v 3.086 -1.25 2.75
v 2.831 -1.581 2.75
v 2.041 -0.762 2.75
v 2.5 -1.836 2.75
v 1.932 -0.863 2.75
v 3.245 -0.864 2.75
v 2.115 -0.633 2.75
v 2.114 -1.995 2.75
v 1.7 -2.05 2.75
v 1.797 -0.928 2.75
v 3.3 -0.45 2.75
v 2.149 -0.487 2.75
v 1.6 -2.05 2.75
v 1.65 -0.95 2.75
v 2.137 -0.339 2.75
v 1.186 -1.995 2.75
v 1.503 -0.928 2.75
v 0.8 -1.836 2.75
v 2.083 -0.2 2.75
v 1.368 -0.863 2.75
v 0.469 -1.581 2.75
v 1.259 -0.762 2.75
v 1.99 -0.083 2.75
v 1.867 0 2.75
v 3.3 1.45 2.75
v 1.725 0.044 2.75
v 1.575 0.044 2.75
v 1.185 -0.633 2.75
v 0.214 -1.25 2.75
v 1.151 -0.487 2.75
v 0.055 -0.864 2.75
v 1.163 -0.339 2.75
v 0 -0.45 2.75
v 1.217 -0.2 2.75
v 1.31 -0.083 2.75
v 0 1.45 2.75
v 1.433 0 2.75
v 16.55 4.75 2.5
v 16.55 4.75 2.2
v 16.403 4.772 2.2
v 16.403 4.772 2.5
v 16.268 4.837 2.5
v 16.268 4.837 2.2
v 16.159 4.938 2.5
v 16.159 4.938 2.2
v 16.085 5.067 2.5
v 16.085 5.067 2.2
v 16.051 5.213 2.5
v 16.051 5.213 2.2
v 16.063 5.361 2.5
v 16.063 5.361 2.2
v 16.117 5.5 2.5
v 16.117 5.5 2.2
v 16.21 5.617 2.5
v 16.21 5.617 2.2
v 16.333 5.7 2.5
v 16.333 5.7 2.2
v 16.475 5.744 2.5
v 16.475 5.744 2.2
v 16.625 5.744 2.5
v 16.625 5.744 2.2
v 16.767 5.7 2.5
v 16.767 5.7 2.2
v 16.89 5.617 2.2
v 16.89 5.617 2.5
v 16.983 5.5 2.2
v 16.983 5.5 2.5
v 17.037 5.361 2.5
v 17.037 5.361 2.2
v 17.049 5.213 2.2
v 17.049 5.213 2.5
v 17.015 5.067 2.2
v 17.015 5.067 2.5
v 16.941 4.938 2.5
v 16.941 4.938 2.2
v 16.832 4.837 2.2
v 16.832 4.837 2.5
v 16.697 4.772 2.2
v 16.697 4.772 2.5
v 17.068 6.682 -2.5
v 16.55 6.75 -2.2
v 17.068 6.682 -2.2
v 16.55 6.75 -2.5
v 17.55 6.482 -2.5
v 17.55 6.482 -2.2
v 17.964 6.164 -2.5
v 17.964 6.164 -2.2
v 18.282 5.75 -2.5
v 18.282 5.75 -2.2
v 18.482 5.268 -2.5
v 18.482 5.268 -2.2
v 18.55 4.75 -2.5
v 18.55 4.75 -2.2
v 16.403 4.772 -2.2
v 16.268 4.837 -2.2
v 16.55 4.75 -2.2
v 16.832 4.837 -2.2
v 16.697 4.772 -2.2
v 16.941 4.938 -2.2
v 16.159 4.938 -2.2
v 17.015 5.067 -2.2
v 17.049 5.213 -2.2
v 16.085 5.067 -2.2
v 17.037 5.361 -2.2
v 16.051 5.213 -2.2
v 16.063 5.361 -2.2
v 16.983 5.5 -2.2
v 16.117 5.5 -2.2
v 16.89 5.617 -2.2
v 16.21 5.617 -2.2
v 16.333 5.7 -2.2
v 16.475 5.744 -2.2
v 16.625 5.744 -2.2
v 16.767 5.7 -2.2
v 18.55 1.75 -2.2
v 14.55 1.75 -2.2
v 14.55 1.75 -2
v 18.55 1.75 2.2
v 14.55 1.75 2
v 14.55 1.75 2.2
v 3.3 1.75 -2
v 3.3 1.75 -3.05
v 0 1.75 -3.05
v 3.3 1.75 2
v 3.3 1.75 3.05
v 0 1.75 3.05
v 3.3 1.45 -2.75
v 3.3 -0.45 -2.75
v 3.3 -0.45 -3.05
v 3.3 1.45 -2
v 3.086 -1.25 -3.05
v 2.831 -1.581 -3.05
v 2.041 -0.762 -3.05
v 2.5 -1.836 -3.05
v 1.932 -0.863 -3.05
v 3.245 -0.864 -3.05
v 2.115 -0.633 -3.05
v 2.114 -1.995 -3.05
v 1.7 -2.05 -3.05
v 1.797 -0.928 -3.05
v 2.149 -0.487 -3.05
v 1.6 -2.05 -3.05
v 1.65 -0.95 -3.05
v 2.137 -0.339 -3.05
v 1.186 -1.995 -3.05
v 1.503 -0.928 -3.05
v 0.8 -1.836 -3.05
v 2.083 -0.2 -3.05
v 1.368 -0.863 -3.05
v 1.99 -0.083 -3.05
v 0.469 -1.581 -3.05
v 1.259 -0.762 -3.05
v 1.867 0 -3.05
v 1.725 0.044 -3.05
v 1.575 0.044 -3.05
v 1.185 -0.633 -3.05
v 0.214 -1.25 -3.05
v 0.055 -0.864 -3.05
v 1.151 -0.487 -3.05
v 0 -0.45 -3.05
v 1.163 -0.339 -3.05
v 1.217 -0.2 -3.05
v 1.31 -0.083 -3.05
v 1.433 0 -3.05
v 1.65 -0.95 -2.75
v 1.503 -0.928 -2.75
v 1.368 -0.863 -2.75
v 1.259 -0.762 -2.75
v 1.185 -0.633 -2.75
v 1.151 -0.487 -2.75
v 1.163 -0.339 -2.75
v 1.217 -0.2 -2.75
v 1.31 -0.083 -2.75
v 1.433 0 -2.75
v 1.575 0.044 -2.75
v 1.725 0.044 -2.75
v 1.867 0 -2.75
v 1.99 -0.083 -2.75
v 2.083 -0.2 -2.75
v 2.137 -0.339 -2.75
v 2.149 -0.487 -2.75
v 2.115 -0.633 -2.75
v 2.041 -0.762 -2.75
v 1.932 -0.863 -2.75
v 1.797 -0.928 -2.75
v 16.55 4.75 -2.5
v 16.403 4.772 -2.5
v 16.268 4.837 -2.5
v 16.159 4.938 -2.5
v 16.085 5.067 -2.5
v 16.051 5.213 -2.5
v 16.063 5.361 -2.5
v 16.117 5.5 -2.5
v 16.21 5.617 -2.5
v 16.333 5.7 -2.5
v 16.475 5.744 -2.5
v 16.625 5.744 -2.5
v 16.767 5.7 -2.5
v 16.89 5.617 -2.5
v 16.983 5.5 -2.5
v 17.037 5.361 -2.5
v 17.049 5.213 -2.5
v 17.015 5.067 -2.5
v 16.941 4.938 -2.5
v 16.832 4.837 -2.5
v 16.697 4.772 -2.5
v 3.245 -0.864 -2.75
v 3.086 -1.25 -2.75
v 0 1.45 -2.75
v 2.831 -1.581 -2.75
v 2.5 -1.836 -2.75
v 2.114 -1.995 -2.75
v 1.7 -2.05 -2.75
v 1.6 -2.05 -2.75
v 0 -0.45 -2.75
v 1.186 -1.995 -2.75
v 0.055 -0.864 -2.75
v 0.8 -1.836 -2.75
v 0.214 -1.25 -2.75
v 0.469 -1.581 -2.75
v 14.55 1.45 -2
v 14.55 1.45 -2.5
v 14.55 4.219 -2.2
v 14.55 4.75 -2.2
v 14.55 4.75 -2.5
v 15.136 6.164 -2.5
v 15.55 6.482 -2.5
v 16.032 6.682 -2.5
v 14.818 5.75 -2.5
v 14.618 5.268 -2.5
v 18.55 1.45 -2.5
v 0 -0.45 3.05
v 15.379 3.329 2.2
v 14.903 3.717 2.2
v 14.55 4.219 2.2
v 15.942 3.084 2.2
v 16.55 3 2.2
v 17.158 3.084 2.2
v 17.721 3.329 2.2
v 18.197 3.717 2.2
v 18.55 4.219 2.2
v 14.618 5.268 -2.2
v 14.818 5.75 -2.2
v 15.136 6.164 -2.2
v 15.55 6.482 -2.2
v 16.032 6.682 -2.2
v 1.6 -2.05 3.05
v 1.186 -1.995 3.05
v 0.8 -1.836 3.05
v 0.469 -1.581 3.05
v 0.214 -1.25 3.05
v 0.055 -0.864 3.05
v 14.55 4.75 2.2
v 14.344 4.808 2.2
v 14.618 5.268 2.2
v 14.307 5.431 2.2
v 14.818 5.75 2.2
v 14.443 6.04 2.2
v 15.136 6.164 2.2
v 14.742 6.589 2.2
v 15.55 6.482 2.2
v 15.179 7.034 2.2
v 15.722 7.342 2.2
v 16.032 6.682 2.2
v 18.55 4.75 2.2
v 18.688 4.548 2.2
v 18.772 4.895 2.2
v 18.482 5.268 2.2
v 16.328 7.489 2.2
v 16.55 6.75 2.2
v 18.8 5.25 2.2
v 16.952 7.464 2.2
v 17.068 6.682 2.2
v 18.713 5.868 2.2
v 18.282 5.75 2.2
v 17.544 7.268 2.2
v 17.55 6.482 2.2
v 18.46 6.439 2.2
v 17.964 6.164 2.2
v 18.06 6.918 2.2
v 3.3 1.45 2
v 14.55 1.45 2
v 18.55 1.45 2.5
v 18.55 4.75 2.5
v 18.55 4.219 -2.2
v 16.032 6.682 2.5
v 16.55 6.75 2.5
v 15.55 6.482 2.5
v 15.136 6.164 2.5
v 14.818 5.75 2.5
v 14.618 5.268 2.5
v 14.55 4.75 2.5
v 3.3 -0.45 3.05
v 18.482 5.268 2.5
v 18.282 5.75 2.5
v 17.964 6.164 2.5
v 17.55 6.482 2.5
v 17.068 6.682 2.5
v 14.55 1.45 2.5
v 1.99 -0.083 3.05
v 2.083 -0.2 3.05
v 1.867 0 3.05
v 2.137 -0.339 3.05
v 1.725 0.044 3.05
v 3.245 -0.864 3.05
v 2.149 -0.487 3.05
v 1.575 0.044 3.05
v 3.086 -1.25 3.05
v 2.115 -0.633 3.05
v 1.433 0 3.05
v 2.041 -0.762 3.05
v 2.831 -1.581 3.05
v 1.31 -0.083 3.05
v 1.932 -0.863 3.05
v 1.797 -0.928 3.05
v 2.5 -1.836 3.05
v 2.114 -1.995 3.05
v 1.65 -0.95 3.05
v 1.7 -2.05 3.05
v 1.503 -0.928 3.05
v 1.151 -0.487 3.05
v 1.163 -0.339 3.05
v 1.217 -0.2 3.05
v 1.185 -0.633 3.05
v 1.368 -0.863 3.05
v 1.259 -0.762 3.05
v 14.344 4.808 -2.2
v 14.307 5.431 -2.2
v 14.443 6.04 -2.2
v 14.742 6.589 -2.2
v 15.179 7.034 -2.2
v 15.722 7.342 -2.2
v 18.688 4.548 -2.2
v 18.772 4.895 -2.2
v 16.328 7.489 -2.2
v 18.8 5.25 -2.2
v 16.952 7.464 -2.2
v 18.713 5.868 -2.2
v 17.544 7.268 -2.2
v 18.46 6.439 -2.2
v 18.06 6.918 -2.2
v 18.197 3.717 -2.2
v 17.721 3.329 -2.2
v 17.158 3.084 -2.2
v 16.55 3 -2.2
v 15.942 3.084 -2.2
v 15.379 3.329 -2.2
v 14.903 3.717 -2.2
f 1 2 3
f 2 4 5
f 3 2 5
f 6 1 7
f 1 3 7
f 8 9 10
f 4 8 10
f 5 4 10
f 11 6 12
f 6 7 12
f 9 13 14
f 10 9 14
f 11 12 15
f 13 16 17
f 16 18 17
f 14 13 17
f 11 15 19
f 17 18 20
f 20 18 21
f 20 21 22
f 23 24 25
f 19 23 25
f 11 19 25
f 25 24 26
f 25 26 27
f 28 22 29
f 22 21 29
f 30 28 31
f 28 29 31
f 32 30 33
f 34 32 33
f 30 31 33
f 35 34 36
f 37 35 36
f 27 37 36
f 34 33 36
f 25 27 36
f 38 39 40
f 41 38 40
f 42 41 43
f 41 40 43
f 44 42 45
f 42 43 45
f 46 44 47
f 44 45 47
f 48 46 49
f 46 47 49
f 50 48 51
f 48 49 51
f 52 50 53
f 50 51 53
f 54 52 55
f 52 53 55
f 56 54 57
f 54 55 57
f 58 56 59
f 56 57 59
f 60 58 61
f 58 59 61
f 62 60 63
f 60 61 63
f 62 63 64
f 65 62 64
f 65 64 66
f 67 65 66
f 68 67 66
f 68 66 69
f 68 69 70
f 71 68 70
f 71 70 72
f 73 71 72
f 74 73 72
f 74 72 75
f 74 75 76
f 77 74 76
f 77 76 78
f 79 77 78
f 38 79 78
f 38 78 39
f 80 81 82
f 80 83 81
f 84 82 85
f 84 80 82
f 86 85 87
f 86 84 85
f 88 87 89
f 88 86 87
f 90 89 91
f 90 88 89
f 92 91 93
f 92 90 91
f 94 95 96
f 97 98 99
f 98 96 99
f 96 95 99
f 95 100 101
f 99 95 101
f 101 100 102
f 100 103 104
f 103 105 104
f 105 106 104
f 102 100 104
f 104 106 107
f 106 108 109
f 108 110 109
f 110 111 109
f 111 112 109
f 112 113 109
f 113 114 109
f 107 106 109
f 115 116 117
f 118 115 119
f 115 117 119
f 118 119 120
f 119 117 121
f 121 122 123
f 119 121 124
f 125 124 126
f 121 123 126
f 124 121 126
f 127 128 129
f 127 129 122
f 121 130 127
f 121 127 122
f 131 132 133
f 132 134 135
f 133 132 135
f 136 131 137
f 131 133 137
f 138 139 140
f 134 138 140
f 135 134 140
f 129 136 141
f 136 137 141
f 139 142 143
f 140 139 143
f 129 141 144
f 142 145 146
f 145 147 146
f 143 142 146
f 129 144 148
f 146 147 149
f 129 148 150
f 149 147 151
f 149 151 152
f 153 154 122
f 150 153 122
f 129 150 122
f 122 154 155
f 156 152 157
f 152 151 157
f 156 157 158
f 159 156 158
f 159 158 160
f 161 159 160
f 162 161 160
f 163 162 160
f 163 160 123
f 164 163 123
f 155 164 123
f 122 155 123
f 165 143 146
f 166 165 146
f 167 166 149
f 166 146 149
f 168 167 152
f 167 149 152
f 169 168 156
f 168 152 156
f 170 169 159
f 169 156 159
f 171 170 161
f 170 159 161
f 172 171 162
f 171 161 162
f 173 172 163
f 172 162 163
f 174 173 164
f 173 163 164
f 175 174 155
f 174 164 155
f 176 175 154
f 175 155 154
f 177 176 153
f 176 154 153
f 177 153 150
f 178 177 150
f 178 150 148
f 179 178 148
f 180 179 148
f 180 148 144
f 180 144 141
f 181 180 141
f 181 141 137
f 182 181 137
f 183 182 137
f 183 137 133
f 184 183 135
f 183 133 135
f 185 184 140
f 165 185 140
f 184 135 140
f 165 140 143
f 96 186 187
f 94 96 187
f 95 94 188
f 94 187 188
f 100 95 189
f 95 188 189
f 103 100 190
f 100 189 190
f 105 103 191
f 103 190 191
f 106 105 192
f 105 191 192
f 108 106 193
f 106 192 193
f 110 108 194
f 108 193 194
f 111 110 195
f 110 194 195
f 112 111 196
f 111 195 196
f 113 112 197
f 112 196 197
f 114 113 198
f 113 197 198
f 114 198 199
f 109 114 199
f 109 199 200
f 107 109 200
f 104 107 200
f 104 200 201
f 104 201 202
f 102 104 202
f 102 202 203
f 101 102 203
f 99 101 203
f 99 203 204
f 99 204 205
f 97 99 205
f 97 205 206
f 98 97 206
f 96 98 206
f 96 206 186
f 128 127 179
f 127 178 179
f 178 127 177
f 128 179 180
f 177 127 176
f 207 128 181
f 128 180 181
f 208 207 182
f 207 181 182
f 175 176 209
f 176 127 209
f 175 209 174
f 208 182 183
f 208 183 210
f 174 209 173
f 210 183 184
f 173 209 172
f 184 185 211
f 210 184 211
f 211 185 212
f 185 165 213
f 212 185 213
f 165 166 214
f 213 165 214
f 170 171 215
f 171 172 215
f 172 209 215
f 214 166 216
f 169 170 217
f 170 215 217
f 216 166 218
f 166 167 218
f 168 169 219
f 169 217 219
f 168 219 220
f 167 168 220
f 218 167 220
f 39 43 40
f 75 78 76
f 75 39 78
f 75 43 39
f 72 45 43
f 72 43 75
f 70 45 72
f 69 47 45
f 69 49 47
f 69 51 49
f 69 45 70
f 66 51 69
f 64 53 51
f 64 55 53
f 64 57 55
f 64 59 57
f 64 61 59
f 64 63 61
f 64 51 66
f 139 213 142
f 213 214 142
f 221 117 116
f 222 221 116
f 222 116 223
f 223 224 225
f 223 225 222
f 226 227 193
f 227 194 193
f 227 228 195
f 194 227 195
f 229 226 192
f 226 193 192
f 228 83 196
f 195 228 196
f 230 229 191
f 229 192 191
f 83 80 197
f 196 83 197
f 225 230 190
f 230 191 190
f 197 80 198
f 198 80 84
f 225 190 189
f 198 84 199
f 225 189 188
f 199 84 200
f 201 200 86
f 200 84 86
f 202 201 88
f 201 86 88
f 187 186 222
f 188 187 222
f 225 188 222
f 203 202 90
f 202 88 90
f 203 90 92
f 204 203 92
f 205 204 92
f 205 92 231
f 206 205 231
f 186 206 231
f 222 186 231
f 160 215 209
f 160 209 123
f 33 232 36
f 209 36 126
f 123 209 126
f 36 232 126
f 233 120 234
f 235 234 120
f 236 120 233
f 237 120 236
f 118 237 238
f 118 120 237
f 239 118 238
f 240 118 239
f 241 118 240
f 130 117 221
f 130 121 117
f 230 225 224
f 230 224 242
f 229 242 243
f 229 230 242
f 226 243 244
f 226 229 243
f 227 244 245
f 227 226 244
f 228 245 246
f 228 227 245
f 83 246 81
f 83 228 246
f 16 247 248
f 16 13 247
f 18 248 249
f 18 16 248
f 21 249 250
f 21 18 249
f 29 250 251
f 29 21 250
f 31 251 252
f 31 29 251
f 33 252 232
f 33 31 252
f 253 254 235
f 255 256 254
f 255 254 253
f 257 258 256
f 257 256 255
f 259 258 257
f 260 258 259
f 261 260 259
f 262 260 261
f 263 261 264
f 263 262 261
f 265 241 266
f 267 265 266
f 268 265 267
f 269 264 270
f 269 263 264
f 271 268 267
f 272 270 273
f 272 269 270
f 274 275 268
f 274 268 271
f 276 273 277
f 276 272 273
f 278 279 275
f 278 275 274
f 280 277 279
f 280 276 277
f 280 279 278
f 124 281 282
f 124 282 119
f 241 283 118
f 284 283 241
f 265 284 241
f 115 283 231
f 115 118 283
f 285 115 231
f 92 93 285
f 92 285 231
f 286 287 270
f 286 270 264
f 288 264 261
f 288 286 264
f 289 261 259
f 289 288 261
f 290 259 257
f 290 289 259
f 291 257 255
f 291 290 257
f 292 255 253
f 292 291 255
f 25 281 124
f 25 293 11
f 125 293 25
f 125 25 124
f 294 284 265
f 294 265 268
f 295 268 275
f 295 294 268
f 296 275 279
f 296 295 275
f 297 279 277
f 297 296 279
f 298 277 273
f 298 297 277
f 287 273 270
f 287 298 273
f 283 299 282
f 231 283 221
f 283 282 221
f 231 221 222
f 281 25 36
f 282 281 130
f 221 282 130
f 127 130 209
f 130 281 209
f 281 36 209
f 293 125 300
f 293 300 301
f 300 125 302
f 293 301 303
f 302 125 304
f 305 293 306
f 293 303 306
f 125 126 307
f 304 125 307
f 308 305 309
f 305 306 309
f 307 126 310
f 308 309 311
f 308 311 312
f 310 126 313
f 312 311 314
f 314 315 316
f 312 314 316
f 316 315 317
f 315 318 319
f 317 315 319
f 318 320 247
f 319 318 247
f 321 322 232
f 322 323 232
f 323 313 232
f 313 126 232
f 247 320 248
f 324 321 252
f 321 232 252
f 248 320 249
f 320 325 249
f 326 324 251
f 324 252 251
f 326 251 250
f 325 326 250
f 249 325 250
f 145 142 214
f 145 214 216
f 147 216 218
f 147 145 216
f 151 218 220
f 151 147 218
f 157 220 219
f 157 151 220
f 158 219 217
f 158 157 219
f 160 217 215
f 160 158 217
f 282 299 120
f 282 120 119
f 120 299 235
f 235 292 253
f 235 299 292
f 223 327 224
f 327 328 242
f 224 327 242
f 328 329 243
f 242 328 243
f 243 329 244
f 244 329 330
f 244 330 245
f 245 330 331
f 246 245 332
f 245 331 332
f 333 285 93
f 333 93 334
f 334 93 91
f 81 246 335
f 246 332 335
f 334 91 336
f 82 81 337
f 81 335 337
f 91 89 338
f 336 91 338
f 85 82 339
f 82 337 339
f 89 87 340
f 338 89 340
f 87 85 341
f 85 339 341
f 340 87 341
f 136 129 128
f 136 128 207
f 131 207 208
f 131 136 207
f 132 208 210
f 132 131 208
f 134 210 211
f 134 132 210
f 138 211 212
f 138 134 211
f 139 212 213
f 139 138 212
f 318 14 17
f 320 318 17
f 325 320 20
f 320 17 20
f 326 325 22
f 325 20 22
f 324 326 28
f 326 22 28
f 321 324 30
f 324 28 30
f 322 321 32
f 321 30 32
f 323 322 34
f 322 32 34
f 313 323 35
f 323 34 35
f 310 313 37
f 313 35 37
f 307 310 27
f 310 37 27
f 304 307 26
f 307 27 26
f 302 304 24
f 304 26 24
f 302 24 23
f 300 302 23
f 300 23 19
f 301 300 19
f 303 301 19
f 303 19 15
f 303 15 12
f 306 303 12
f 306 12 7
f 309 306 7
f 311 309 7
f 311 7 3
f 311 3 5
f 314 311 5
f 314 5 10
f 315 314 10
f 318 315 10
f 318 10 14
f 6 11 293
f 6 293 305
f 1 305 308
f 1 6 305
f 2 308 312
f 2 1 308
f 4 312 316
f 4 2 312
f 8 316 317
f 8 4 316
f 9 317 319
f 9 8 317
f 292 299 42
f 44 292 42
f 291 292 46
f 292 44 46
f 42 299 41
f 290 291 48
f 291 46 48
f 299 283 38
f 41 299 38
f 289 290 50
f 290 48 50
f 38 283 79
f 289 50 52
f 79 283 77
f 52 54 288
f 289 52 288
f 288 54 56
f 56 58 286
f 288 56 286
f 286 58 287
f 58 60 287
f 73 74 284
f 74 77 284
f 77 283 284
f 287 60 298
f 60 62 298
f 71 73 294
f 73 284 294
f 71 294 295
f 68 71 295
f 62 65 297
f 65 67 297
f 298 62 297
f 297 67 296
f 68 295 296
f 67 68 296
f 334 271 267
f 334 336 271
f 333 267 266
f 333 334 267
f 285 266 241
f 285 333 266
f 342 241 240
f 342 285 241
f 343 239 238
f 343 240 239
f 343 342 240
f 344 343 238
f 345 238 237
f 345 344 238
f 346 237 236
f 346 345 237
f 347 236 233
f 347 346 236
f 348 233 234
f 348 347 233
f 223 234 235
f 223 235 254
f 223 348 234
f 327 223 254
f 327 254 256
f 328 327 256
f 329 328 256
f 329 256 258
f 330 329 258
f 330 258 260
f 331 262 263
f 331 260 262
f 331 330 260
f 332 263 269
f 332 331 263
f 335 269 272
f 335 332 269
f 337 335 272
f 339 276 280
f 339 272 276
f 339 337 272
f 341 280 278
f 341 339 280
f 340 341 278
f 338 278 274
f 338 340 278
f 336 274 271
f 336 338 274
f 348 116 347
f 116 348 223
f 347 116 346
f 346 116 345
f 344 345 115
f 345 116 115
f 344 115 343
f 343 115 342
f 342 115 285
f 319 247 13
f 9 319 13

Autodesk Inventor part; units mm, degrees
ref_plane "YZ Plane" through (0, 0, 0) normal (1, 0, 0) x (0, 1, 0)
ref_plane "XZ Plane" through (0, 0, 0) normal (0, 1, 0) x (-1, 0, 0)
ref_plane "XY Plane" through (0, 0, 0) normal (0, 0, 1) x (1, 0, 0)
sketch "Sketch1" plane through (0, 0, 0) normal (1, 0, 0) x (0, 1, 0)
  line L0 (1.75, 3.05) -> (-2.05, 3.05)
  line L1 (-2.05, 3.05) -> (-2.05, 2.75)
  line L2 (-2.05, 2.75) -> (1.45, 2.75)
  line L3 (1.45, 2.75) -> (1.45, -2.75)
  line L4 (1.45, -2.75) -> (-2.05, -2.75)
  line L5 (-2.05, -2.75) -> (-2.05, -3.05)
  line L6 (-2.05, -3.05) -> (1.75, -3.05)
  line L7 (1.75, -3.05) -> (1.75, 3.05)
  point P0 (0, 0)
  dimension "d0" = 0.3
  dimension "d1" = 0.3
  dimension "d2" = 0.3
  dimension "d4" = 3.5
  dimension "d15" = 6.1
  dimension "d16" = 3.05
  dimension "d17" = 1.75
extrude "Extrusion1" add sketch "Sketch1" along normal blind 3.3
fillet "Fillet1" radius 1.6 4 edges at (3.3, -2.05, 2.9) (0, -2.05, 2.9) (0, -2.05, -2.9) (3.3, -2.05, -2.9)
sketch "Sketch2" plane through (0, 1.75, 3.05) normal (0, 0, 1) x (1, 0, 0)
  arc A0 (1.7, -3.8) -> (3.3, -2.2) centre (1.7, -2.2) ccw projected
  arc A1 (0, -2.2) -> (1.6, -3.8) centre (1.6, -2.2) ccw projected
  line L0 (1.6, -2.2) -> (1.7, -2.2)
  point P0 (0, -1.75)
  point P1 (1.65, -2.2)
hole "Hole1" at (1.65, -0.45, 3.05) direction (0, 0, -1) diameter 1 end through all
sketch "Sketch3" plane through (3.3, 0, 0) normal (1, 0, 0) x (0, 0, -1)
  line L0 (3.05, 1.75) -> (-3.05, 1.75) projected
  line L1 (0, 1.75) -> (0, 1.45)
  line L2 (-2.75, 1.45) -> (2.75, 1.45) projected
  line L3 (2, 1.45) -> (-2, 1.45)
  line L4 (-2, 1.45) -> (-2, 1.75)
  line L5 (-2, 1.75) -> (2, 1.75)
  line L6 (2, 1.75) -> (2, 1.45)
  line L7 (2, 1.45) -> (-2, 1.75) construction
  line L8 (-2, 1.45) -> (2, 1.75) construction
  point P0 (0, 0)
  point P1 (0, 1.6)
  dimension "d18" = 4
extrude "Extrusion2" add sketch "Sketch3" along normal blind 15.25
sketch "Sketch4" plane through (18.55, 0, 0) normal (1, 0, 0) x (0, 0, -1)
  line L0 (-2.75, 1.45) -> (2.75, 1.45) projected
  line L1 (0, 1.45) -> (0, 1.75)
  line L2 (3.05, 1.75) -> (-3.05, 1.75) projected
  line L3 (2.5, 1.45) -> (-2.5, 1.45)
  line L4 (-2.5, 1.45) -> (-2.5, 1.75)
  line L5 (-2.5, 1.75) -> (2.5, 1.75)
  line L6 (2.5, 1.75) -> (2.5, 1.45)
  line L7 (2.5, 1.45) -> (-2.5, 1.75) construction
  line L8 (-2.5, 1.45) -> (2.5, 1.75) construction
  line L9 (-2.5, 1.75) -> (-2.2, 1.75)
  line L10 (-2.2, 1.75) -> (-2.2, 6.75)
  line L11 (-2.2, 6.75) -> (-2.5, 6.75)
  line L12 (-2.5, 6.75) -> (-2.5, 1.75)
  line L13 (2.5, 1.75) -> (2.2, 1.75)
  line L14 (2.2, 1.75) -> (2.2, 6.75)
  line L15 (2.2, 6.75) -> (2.5, 6.75)
  line L16 (2.5, 6.75) -> (2.5, 1.75)
  point P0 (0, 0)
  point P1 (0, 1.6)
  dimension "d21" = 5
  dimension "d22" = 0.3
  dimension "d23" = 0.3
  dimension "d24" = 5
extrude "Extrusion3" add sketch "Sketch4" against normal blind 4
fillet "Fillet2" radius 2 4 edges at (18.55, 6.75, 2.35) (14.55, 6.75, 2.35) (14.55, 6.75, -2.35) (18.55, 6.75, -2.35)
sketch "Sketch5" plane through (14.55, 1.45, 2.5) normal (0, 0, 1) x (1, 0, 0)
  arc A0 (4, 3.3) -> (0, 3.3) centre (2, 3.3) ccw projected
  point P0 (-14.55, -1.45)
  point P1 (2, 3.8)
  dimension "d35" = 0.5
hole "Hole2" at (16.55, 5.25, 2.5) direction (0, 0, -1) diameter 1 end through all
sketch "Sketch6" plane through (14.55, 1.75, -2.2) normal (0, 0, 1) x (1, 0, 0)
  circle A0 centre (2, 3.5) radius 0.5 projected
  circle A1 centre (2, 3.5) radius 0.5 projected
  circle A2 centre (2, 3.5) radius 2.25
  point P0 (-14.55, -1.75)
  dimension "d36" = 4.5
extrude "Extrusion4" add sketch "Sketch6" along normal blind 4.4 contours A0 | A2
ref_plane "Work Plane1" through (-1.2438, 1.2458, -3.05) normal (-0.9978, 0.0664, 0) x (-0.0664, -0.9978, 0)
sketch "Sketch7" plane through (-1.2438, 1.2458, -3.05) normal (-0.9978, 0.0664, 0) x (-0.0664, -0.9978, 0)
  circle A0 centre (-6.8395, 3.05) radius 0.875
  point P0 (1.1605, 3.05)
  dimension "d39" = 1.75
  dimension "d40" = 8
properties part number "Arm"
